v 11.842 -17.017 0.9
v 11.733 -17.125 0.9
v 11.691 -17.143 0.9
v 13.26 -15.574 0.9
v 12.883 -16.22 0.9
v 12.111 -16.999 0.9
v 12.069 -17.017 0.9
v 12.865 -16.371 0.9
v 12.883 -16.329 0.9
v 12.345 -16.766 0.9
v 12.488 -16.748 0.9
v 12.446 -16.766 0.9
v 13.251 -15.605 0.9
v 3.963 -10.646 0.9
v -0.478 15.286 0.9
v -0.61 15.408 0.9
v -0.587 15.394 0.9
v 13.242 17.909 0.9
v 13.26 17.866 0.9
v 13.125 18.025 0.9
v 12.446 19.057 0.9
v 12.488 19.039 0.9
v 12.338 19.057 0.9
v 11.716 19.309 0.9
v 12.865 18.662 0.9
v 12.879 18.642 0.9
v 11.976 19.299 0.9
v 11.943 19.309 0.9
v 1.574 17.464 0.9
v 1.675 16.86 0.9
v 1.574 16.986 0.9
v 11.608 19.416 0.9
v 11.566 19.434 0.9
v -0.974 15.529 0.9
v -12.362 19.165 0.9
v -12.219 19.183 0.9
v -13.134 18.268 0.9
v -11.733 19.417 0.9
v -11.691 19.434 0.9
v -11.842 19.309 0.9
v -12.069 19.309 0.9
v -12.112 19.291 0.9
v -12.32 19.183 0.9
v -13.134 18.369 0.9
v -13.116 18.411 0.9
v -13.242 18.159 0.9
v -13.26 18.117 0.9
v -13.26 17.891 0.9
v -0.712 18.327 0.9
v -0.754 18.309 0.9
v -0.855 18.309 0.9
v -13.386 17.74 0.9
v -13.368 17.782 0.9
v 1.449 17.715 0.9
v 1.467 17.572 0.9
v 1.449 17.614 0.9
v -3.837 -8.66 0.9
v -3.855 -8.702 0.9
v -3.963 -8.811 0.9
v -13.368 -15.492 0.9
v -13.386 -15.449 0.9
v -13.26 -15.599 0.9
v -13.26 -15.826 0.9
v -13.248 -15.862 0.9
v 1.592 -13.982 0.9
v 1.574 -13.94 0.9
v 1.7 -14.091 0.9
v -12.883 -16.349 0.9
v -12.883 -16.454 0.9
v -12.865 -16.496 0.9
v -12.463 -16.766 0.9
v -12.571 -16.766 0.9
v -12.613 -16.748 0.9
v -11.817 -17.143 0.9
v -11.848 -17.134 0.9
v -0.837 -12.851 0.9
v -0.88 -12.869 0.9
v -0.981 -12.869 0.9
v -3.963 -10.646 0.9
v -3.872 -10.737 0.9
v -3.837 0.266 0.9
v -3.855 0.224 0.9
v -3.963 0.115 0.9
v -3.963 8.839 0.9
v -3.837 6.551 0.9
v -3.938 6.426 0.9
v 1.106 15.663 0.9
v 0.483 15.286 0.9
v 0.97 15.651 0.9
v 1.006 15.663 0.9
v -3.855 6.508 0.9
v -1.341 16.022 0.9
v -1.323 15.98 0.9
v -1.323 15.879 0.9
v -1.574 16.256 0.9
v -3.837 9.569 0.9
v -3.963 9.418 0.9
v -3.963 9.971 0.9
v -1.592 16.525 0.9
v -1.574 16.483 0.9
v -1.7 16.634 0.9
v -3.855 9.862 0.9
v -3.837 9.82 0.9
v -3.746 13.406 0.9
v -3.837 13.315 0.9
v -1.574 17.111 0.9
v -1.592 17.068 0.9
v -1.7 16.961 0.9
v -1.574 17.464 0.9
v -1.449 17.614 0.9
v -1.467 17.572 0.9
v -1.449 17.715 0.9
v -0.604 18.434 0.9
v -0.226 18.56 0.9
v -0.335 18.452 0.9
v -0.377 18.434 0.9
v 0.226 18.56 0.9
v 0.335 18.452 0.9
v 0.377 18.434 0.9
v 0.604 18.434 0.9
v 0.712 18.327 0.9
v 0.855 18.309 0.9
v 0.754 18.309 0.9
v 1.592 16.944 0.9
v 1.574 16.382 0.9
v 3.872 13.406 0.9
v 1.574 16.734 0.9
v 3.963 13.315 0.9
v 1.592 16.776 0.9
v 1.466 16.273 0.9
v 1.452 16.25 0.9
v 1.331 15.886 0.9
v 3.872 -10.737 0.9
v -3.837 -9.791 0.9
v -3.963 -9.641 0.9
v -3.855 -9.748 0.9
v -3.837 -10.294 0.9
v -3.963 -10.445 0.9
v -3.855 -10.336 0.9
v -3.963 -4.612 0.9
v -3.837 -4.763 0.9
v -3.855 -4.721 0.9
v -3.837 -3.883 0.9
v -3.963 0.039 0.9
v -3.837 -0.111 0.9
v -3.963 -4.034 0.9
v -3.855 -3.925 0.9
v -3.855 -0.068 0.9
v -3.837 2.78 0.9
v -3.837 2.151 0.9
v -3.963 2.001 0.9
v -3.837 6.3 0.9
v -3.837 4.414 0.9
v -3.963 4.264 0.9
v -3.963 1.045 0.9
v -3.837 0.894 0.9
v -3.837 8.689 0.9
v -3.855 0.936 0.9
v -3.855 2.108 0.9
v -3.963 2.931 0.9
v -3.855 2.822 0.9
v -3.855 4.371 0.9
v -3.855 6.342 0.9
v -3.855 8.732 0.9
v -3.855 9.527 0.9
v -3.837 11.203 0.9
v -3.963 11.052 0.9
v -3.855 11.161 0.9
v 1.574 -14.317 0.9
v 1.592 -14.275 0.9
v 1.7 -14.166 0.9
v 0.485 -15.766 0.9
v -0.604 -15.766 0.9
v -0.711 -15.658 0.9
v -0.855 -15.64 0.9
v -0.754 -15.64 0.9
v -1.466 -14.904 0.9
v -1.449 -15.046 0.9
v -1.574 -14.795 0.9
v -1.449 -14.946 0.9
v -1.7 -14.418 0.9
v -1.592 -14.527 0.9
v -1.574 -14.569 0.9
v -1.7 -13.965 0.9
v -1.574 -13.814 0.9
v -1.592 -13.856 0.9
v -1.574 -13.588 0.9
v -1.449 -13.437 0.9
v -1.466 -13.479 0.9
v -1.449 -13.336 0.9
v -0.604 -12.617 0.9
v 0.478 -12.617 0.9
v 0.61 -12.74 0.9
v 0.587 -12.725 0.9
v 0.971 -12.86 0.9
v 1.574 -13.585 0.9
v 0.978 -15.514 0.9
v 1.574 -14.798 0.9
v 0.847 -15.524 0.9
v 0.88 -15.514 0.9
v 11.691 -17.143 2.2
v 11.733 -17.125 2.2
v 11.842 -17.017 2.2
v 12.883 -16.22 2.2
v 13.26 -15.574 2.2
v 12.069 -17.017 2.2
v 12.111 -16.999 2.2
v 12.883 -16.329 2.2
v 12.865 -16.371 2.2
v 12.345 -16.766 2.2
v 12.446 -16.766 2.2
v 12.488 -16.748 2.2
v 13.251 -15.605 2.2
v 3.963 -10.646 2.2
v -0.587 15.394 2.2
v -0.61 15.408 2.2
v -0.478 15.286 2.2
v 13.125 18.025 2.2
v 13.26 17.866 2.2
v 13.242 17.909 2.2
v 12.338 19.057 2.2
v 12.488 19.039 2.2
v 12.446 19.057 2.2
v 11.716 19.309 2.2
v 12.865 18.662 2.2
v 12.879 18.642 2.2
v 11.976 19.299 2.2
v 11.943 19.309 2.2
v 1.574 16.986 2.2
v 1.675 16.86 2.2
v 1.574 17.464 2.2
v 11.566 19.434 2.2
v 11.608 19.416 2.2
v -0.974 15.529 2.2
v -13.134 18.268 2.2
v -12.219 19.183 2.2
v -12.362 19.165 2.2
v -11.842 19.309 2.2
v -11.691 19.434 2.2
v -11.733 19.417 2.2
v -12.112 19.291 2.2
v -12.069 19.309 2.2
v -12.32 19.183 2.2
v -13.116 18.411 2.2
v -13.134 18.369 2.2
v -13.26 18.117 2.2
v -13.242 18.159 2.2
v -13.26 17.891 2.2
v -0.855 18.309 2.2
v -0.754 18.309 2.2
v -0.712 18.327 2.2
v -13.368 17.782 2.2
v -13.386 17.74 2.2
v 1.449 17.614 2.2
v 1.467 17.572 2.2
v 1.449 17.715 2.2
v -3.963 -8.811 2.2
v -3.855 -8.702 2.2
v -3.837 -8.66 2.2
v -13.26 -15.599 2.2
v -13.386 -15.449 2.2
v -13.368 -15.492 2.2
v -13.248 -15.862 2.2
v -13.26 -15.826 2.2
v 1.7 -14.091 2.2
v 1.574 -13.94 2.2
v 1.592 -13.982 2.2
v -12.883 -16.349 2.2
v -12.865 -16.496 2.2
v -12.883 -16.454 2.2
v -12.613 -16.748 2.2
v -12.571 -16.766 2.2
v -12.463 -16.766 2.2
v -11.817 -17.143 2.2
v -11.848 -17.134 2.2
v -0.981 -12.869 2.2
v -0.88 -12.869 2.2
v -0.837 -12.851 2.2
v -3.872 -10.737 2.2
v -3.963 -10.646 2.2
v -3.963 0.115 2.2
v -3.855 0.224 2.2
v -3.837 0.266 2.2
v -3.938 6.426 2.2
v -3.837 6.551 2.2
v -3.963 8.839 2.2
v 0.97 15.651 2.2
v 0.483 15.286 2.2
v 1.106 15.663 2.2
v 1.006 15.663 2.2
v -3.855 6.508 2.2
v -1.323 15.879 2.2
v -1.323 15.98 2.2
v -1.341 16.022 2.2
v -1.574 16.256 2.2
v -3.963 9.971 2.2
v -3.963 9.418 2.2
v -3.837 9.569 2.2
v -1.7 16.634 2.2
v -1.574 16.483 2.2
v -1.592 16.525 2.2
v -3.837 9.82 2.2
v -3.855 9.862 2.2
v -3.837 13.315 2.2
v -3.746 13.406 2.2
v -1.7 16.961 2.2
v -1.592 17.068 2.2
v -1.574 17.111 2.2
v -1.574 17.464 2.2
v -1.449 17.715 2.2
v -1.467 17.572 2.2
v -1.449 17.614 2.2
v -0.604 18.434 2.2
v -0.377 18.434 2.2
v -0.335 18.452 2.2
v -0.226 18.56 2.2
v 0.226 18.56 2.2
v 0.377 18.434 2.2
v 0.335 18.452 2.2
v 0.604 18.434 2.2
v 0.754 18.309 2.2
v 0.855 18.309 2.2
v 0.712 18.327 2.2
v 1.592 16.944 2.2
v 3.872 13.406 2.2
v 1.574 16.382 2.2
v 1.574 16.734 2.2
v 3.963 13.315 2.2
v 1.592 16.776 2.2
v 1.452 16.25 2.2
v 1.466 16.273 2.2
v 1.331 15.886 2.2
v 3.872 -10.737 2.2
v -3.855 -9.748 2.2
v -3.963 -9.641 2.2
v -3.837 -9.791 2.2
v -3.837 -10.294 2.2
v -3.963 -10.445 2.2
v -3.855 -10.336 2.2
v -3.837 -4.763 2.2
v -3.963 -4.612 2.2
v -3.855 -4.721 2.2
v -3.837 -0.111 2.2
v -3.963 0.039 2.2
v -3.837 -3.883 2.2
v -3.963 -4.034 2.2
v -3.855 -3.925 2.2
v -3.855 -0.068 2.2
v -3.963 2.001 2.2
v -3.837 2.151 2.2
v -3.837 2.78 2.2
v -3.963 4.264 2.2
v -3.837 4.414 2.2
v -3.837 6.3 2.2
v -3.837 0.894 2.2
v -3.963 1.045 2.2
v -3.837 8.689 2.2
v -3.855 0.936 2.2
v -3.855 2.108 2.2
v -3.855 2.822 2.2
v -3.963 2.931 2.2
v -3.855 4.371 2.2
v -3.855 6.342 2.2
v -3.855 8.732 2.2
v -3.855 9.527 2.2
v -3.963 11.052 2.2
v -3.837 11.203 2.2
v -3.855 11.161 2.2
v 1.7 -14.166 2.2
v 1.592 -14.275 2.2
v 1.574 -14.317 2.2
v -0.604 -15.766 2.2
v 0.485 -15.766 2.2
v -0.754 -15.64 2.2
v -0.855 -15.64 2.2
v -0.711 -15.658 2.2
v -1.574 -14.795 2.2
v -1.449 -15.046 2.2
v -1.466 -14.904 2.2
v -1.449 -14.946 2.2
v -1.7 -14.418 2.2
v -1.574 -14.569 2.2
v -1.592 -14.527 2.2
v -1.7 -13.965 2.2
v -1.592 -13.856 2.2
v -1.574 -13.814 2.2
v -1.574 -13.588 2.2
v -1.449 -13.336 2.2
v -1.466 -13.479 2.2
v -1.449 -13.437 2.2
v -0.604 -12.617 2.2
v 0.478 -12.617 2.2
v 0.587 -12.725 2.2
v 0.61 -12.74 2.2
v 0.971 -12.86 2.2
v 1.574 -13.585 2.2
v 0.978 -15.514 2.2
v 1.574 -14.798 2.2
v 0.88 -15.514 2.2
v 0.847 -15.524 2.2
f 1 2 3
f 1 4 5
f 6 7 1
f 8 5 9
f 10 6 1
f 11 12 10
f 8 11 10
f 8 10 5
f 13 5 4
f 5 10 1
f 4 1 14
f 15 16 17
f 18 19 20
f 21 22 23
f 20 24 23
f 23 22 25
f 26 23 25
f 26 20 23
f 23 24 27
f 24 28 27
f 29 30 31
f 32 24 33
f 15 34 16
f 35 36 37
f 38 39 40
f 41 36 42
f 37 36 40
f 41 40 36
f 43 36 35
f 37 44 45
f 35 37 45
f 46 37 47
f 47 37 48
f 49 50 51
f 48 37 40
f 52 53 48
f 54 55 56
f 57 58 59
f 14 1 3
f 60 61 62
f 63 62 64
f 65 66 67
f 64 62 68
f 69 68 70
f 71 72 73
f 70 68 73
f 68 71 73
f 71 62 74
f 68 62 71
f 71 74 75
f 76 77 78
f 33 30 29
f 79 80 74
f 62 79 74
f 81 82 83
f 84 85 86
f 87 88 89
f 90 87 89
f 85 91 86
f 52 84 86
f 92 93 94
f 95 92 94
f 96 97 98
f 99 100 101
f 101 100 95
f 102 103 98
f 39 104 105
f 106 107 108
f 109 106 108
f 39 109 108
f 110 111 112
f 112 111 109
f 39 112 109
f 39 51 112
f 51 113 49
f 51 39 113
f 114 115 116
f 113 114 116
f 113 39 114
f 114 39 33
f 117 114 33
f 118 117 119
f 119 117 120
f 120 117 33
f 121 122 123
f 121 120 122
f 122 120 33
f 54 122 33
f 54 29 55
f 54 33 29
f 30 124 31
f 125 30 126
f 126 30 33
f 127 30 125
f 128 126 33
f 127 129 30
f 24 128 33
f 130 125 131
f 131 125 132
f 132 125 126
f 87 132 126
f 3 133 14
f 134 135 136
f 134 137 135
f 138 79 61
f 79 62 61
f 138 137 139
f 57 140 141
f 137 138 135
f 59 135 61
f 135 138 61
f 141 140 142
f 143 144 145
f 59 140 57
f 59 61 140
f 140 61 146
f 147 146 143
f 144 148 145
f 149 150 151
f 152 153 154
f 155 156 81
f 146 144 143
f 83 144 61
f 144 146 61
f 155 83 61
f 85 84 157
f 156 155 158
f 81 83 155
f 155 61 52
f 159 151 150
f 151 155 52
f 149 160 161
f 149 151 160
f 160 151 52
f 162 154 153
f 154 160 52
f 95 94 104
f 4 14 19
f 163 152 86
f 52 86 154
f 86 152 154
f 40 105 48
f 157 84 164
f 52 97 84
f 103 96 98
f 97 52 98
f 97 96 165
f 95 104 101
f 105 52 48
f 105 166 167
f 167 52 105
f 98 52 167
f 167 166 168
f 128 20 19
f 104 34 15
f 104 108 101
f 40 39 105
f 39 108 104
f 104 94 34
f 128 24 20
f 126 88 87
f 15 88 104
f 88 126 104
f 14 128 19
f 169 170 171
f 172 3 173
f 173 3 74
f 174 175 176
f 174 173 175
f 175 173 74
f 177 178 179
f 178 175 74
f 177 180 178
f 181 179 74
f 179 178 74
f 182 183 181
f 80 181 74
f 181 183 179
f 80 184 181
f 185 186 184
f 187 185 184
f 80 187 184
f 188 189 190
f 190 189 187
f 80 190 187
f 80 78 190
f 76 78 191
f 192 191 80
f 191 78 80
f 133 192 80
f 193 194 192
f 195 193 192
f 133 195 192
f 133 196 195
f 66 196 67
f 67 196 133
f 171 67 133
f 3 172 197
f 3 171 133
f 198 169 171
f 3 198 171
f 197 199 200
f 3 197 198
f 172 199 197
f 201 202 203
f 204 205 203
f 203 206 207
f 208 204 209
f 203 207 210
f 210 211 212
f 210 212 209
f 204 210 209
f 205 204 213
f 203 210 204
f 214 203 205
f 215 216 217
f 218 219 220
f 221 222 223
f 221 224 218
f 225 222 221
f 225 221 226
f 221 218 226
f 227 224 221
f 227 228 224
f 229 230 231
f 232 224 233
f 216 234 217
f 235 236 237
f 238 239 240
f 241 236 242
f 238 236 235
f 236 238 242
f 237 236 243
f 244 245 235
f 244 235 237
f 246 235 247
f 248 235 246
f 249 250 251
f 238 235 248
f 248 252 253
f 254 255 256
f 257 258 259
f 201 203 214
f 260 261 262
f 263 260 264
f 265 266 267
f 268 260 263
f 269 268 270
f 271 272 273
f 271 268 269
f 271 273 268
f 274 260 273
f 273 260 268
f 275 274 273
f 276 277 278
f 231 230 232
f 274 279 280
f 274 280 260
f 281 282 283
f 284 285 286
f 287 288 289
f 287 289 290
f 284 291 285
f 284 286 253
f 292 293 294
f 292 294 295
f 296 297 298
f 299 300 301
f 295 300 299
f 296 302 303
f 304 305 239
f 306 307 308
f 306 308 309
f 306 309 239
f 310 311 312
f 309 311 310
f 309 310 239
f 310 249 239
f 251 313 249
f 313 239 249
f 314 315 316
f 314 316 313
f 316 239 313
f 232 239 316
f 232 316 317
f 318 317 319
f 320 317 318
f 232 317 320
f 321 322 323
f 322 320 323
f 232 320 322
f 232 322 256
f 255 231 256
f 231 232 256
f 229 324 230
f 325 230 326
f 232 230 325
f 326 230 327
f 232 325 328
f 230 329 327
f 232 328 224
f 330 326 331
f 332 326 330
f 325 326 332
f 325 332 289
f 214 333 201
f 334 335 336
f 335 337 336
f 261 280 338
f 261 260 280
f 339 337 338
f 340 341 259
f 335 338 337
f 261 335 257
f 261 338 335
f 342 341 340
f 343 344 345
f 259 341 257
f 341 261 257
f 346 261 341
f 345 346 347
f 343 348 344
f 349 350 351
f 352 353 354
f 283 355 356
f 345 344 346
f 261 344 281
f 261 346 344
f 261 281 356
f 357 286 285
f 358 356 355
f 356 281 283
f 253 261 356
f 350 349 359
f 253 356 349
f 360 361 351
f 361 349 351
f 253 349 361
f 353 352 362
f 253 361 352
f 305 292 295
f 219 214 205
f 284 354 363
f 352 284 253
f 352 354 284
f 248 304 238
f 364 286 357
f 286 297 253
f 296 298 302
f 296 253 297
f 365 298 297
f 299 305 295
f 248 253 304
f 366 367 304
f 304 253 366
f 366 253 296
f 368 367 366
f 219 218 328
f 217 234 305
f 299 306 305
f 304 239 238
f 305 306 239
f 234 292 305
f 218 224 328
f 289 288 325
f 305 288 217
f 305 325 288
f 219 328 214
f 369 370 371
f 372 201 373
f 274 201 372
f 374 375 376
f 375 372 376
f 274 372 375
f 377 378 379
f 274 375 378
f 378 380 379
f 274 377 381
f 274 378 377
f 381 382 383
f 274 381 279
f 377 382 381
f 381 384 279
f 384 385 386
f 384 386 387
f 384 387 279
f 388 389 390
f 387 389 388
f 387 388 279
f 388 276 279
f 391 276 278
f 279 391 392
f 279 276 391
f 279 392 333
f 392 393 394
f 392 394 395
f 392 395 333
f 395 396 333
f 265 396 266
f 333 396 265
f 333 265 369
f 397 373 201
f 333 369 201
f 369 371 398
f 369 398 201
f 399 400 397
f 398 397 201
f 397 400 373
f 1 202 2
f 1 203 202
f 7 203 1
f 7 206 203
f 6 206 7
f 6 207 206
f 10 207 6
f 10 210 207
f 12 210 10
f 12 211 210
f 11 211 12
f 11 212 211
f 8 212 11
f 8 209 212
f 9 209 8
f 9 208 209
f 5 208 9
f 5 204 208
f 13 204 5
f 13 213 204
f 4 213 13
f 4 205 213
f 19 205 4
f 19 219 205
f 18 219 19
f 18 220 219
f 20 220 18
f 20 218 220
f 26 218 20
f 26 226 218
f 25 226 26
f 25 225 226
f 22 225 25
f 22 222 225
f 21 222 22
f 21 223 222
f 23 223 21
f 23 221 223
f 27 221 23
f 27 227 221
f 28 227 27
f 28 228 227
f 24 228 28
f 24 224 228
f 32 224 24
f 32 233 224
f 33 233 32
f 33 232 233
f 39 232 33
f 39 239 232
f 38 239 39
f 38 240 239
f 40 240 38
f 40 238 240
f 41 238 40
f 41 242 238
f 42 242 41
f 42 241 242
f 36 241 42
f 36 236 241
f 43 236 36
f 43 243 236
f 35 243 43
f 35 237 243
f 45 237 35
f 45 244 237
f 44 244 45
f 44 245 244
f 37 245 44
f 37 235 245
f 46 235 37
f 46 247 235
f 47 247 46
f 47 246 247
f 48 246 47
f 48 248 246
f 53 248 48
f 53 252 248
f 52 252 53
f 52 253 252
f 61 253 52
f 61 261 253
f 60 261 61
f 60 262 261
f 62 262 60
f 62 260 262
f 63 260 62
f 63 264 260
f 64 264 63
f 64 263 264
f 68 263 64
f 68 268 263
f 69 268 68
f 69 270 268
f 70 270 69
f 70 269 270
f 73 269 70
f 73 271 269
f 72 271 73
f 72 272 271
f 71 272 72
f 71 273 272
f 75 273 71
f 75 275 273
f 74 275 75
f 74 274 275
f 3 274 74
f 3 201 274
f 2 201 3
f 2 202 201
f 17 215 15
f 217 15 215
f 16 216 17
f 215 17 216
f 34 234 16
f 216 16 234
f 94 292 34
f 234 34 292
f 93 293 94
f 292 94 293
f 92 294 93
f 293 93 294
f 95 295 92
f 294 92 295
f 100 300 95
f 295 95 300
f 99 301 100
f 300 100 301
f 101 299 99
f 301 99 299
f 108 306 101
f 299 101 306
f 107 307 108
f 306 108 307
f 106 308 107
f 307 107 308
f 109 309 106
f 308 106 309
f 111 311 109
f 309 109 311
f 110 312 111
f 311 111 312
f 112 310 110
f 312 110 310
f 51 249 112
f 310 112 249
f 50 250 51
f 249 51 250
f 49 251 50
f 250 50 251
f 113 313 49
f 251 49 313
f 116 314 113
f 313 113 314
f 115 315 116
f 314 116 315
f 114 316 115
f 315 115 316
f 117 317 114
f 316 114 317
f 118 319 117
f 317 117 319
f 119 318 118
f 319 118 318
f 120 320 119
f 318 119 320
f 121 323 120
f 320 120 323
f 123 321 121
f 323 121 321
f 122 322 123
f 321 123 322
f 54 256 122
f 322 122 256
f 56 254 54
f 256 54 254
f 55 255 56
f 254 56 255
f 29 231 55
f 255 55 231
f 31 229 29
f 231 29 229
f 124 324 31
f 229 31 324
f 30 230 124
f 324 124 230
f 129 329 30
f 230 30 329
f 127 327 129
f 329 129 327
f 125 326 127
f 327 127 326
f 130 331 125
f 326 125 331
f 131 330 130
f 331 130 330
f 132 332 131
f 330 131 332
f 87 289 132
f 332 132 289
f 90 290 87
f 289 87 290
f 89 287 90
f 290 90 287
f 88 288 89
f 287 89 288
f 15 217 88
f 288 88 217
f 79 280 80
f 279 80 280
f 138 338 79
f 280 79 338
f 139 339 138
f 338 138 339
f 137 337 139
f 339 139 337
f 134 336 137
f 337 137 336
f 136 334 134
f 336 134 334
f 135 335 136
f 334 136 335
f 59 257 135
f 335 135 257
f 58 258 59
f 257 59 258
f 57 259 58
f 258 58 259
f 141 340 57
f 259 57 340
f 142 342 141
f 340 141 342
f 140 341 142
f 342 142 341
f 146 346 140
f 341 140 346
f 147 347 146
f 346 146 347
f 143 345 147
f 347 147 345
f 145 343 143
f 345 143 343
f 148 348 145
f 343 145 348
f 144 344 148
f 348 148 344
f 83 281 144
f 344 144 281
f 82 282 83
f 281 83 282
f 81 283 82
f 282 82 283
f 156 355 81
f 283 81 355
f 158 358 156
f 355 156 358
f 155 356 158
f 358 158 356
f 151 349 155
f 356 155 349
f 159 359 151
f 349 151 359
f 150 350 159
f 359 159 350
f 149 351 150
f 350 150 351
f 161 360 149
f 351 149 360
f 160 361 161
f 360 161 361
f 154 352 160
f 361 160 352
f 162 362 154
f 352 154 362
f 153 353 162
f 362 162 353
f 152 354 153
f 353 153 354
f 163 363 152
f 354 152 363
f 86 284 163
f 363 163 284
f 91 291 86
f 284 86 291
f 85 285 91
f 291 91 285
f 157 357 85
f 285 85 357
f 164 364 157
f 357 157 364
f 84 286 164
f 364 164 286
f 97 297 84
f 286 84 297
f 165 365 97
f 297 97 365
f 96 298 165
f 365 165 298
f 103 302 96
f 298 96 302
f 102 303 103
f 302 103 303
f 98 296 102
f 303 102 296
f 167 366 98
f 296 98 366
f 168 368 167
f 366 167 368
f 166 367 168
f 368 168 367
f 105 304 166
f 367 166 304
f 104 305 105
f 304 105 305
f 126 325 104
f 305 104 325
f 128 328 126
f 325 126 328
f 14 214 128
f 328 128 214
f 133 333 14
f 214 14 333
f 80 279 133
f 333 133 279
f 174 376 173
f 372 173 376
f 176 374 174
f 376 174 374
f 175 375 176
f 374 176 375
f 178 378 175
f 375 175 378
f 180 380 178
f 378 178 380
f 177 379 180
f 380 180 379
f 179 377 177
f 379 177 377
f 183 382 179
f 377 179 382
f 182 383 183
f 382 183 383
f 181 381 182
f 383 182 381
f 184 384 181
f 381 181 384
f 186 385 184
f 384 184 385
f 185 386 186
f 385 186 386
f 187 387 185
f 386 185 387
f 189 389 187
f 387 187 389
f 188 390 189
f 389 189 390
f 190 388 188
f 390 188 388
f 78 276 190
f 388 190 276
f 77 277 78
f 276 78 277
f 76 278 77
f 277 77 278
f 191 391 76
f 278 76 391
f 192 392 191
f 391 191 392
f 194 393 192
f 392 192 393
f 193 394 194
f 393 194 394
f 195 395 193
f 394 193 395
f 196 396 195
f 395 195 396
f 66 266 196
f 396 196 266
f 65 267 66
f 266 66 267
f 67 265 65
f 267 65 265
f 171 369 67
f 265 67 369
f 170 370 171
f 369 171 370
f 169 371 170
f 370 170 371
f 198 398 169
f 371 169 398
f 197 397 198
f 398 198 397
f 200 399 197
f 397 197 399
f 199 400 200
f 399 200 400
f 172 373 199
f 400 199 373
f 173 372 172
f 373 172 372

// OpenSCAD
$fn = 24;
translate([0, -2.500, 0.900])
  linear_extrude(height=1.300) {
offset(r=0.06, $fn=8) {
    polygon(points=[[-12.320,21.623],[-13.074,20.869],[-13.074,20.743],[-13.200,20.617],[-13.200,20.366],[-13.326,20.240],[-13.326,-12.949],[-13.200,-13.074],[-13.200,-13.326],[-12.823,-13.829],[-12.823,-13.954],[-12.571,-14.206],[-12.446,-14.206],[-11.817,-14.583],[11.691,-14.583],[11.817,-14.457],[12.069,-14.457],[12.320,-14.206],[12.446,-14.206],[12.823,-13.829],[12.823,-13.703],[13.200,-13.074],[13.200,20.366],[13.074,20.491],[12.823,21.120],[12.446,21.497],[12.320,21.497],[11.943,21.749],[11.691,21.749],[11.566,21.874],[-11.691,21.874],[-11.817,21.749],[-12.069,21.749],[-12.194,21.623],[-0.629,-10.057],[0.503,-10.057],[0.629,-10.183],[1.006,-10.309],[1.634,-11.063],[1.634,-11.440],[1.760,-11.566],[1.760,-11.691],[1.634,-11.817],[1.634,-12.320],[1.006,-13.074],[0.880,-13.074],[0.503,-13.326],[-0.629,-13.326],[-0.754,-13.200],[-0.880,-13.200],[-1.509,-12.571],[-1.509,-12.446],[-1.634,-12.320],[-1.634,-12.069],[-1.760,-11.943],[-1.760,-11.440],[-1.634,-11.314],[-1.634,-11.063],[-1.509,-10.937],[-1.509,-10.811],[-1.006,-10.309],[-0.880,-10.309],[-3.771,15.966],[3.897,15.966],[4.023,15.840],[4.023,-8.171],[3.897,-8.297],[-3.897,-8.297],[-4.023,-8.171],[-4.023,-7.920],[-3.897,-7.794],[-3.897,-7.291],[-4.023,-7.166],[-4.023,-6.286],[-3.897,-6.160],[-3.897,-2.263],[-4.023,-2.137],[-4.023,-1.509],[-3.897,-1.383],[-3.897,2.389],[-4.023,2.514],[-4.023,2.640],[-3.897,2.766],[-3.897,3.394],[-4.023,3.520],[-4.023,4.526],[-3.897,4.651],[-3.897,5.280],[-4.023,5.406],[-4.023,6.789],[-3.897,6.914],[-3.897,8.800],[-4.023,8.926],[-3.897,9.051],[-3.897,11.189],[-4.023,11.314],[-4.023,11.943],[-3.897,12.069],[-3.897,12.320],[-4.023,12.446],[-4.023,13.577],[-3.897,13.703],[-3.897,15.840],[-0.251,21.120],[0.251,21.120],[0.377,20.994],[0.629,20.994],[0.754,20.869],[0.880,20.869],[1.509,20.240],[1.509,20.114],[1.634,19.989],[1.634,19.486],[1.760,19.360],[1.634,19.234],[1.634,18.857],[1.509,18.731],[1.383,18.354],[1.131,18.103],[1.006,18.103],[0.503,17.726],[-0.503,17.726],[-0.629,17.851],[-1.006,17.977],[-1.383,18.354],[-1.383,18.480],[-1.634,18.731],[-1.634,18.983],[-1.760,19.109],[-1.760,19.486],[-1.634,19.611],[-1.634,19.989],[-1.509,20.114],[-1.509,20.240],[-0.880,20.869],[-0.754,20.869],[-0.629,20.994],[-0.377,20.994]], paths=[[0,1,2,3,4,5,6,7,8,9,10,11,12,13,14,15,16,17,18,19,20,21,22,23,24,25,26,27,28,29,30,31,32,33],[34,35,36,37,38,39,40,41,42,43,44,45,46,47,48,49,50,51,52,53,54,55,56,57,58,59,60,61],[62,63,64,65,66,67,68,69,70,71,72,73,74,75,76,77,78,79,80,81,82,83,84,85,86,87,88,89,90,91,92,93,94,95,96,97,98,99,100,101,102],[103,104,105,106,107,108,109,110,111,112,113,114,115,116,117,118,119,120,121,122,123,124,125,126,127,128,129,130,131,132,133,134,135,136,137]]);
}
}
